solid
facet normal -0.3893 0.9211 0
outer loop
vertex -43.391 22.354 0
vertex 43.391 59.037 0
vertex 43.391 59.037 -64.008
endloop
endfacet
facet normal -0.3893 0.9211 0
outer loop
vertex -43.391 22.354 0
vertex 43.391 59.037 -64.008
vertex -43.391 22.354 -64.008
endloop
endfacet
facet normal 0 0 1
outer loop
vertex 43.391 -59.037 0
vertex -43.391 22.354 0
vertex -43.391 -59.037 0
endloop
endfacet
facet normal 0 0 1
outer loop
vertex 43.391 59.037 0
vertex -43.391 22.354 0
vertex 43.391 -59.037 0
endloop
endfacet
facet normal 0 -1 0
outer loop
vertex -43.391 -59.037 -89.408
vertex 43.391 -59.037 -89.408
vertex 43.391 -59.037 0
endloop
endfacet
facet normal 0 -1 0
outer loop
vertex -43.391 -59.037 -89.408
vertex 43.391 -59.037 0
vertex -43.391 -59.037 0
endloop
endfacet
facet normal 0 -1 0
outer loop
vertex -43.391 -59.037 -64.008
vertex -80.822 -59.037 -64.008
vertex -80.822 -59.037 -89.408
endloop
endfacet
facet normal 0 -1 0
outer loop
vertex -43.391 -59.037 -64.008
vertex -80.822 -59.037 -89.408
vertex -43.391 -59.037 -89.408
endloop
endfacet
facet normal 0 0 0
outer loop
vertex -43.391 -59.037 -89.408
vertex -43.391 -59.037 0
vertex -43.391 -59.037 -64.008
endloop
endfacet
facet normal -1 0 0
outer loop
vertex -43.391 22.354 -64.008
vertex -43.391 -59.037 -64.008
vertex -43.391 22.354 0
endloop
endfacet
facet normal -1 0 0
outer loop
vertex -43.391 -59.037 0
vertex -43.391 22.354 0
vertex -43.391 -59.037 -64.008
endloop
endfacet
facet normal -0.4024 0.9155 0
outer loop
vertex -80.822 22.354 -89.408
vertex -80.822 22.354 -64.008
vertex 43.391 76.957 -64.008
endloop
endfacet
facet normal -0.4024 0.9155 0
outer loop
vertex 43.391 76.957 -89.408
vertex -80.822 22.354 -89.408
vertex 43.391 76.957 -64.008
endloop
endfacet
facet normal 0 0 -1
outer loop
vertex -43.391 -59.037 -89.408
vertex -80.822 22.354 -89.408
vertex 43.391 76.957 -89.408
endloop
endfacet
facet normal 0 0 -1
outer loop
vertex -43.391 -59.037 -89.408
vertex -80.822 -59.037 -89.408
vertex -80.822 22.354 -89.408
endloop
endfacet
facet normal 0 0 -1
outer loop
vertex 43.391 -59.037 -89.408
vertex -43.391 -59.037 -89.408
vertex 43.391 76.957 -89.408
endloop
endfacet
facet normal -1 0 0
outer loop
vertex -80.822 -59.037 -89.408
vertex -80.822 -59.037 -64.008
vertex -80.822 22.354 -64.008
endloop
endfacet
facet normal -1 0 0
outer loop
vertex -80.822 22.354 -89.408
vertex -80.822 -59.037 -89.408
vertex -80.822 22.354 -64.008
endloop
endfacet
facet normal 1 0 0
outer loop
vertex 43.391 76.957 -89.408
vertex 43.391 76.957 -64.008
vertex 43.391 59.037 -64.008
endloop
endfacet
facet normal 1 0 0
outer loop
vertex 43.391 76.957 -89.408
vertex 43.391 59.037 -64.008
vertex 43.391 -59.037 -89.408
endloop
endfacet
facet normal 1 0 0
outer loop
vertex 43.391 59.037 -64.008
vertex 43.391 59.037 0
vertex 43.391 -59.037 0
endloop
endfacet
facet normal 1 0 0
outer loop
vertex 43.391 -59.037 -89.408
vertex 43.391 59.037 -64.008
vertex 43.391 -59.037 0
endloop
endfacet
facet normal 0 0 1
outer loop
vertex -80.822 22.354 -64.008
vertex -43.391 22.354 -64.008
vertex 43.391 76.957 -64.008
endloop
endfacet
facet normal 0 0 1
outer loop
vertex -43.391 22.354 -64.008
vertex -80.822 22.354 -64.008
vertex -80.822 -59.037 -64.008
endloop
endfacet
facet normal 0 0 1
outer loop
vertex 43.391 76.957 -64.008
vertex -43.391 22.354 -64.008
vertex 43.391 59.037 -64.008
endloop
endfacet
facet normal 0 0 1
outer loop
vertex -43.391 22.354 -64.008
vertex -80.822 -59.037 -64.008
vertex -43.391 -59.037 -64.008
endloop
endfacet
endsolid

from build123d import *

# Parameters (mm, degrees)
F1_DEPTH = 64.008
F2_W     = 37.431452
F2_H     = 81.391217
F3_DEPTH = 25.4


with BuildPart() as f1:
    # F0 (on Top) → F1 (new body)
    with BuildSketch(Plane.XY):
        Polygon((-43.390859, 22.354396), (-43.390859, -59.036821), (43.390859, -59.036821), (43.390859, 59.036821), align=None)
    extrude(amount=-F1_DEPTH)

    # F2 (on face) → F3 (join)
    with BuildSketch(Plane(origin=(0, 0, -64.008), x_dir=(1, 0, 0), z_dir=(0, 0, -1))):
        with Locations((-62.106585, 18.341212)):
            Rectangle(F2_W, F2_H)
        Polygon((43.390859, -59.036821), (-43.390859, -22.354396), (-80.822311, -22.354396), (43.390859, -76.956891), align=None)
        Polygon((-43.390859, 59.036821), (-43.390859, -22.354396), (43.390859, -59.036821), (43.390859, 59.036821), align=None)
    extrude(amount=F3_DEPTH)


solid = f1.part
